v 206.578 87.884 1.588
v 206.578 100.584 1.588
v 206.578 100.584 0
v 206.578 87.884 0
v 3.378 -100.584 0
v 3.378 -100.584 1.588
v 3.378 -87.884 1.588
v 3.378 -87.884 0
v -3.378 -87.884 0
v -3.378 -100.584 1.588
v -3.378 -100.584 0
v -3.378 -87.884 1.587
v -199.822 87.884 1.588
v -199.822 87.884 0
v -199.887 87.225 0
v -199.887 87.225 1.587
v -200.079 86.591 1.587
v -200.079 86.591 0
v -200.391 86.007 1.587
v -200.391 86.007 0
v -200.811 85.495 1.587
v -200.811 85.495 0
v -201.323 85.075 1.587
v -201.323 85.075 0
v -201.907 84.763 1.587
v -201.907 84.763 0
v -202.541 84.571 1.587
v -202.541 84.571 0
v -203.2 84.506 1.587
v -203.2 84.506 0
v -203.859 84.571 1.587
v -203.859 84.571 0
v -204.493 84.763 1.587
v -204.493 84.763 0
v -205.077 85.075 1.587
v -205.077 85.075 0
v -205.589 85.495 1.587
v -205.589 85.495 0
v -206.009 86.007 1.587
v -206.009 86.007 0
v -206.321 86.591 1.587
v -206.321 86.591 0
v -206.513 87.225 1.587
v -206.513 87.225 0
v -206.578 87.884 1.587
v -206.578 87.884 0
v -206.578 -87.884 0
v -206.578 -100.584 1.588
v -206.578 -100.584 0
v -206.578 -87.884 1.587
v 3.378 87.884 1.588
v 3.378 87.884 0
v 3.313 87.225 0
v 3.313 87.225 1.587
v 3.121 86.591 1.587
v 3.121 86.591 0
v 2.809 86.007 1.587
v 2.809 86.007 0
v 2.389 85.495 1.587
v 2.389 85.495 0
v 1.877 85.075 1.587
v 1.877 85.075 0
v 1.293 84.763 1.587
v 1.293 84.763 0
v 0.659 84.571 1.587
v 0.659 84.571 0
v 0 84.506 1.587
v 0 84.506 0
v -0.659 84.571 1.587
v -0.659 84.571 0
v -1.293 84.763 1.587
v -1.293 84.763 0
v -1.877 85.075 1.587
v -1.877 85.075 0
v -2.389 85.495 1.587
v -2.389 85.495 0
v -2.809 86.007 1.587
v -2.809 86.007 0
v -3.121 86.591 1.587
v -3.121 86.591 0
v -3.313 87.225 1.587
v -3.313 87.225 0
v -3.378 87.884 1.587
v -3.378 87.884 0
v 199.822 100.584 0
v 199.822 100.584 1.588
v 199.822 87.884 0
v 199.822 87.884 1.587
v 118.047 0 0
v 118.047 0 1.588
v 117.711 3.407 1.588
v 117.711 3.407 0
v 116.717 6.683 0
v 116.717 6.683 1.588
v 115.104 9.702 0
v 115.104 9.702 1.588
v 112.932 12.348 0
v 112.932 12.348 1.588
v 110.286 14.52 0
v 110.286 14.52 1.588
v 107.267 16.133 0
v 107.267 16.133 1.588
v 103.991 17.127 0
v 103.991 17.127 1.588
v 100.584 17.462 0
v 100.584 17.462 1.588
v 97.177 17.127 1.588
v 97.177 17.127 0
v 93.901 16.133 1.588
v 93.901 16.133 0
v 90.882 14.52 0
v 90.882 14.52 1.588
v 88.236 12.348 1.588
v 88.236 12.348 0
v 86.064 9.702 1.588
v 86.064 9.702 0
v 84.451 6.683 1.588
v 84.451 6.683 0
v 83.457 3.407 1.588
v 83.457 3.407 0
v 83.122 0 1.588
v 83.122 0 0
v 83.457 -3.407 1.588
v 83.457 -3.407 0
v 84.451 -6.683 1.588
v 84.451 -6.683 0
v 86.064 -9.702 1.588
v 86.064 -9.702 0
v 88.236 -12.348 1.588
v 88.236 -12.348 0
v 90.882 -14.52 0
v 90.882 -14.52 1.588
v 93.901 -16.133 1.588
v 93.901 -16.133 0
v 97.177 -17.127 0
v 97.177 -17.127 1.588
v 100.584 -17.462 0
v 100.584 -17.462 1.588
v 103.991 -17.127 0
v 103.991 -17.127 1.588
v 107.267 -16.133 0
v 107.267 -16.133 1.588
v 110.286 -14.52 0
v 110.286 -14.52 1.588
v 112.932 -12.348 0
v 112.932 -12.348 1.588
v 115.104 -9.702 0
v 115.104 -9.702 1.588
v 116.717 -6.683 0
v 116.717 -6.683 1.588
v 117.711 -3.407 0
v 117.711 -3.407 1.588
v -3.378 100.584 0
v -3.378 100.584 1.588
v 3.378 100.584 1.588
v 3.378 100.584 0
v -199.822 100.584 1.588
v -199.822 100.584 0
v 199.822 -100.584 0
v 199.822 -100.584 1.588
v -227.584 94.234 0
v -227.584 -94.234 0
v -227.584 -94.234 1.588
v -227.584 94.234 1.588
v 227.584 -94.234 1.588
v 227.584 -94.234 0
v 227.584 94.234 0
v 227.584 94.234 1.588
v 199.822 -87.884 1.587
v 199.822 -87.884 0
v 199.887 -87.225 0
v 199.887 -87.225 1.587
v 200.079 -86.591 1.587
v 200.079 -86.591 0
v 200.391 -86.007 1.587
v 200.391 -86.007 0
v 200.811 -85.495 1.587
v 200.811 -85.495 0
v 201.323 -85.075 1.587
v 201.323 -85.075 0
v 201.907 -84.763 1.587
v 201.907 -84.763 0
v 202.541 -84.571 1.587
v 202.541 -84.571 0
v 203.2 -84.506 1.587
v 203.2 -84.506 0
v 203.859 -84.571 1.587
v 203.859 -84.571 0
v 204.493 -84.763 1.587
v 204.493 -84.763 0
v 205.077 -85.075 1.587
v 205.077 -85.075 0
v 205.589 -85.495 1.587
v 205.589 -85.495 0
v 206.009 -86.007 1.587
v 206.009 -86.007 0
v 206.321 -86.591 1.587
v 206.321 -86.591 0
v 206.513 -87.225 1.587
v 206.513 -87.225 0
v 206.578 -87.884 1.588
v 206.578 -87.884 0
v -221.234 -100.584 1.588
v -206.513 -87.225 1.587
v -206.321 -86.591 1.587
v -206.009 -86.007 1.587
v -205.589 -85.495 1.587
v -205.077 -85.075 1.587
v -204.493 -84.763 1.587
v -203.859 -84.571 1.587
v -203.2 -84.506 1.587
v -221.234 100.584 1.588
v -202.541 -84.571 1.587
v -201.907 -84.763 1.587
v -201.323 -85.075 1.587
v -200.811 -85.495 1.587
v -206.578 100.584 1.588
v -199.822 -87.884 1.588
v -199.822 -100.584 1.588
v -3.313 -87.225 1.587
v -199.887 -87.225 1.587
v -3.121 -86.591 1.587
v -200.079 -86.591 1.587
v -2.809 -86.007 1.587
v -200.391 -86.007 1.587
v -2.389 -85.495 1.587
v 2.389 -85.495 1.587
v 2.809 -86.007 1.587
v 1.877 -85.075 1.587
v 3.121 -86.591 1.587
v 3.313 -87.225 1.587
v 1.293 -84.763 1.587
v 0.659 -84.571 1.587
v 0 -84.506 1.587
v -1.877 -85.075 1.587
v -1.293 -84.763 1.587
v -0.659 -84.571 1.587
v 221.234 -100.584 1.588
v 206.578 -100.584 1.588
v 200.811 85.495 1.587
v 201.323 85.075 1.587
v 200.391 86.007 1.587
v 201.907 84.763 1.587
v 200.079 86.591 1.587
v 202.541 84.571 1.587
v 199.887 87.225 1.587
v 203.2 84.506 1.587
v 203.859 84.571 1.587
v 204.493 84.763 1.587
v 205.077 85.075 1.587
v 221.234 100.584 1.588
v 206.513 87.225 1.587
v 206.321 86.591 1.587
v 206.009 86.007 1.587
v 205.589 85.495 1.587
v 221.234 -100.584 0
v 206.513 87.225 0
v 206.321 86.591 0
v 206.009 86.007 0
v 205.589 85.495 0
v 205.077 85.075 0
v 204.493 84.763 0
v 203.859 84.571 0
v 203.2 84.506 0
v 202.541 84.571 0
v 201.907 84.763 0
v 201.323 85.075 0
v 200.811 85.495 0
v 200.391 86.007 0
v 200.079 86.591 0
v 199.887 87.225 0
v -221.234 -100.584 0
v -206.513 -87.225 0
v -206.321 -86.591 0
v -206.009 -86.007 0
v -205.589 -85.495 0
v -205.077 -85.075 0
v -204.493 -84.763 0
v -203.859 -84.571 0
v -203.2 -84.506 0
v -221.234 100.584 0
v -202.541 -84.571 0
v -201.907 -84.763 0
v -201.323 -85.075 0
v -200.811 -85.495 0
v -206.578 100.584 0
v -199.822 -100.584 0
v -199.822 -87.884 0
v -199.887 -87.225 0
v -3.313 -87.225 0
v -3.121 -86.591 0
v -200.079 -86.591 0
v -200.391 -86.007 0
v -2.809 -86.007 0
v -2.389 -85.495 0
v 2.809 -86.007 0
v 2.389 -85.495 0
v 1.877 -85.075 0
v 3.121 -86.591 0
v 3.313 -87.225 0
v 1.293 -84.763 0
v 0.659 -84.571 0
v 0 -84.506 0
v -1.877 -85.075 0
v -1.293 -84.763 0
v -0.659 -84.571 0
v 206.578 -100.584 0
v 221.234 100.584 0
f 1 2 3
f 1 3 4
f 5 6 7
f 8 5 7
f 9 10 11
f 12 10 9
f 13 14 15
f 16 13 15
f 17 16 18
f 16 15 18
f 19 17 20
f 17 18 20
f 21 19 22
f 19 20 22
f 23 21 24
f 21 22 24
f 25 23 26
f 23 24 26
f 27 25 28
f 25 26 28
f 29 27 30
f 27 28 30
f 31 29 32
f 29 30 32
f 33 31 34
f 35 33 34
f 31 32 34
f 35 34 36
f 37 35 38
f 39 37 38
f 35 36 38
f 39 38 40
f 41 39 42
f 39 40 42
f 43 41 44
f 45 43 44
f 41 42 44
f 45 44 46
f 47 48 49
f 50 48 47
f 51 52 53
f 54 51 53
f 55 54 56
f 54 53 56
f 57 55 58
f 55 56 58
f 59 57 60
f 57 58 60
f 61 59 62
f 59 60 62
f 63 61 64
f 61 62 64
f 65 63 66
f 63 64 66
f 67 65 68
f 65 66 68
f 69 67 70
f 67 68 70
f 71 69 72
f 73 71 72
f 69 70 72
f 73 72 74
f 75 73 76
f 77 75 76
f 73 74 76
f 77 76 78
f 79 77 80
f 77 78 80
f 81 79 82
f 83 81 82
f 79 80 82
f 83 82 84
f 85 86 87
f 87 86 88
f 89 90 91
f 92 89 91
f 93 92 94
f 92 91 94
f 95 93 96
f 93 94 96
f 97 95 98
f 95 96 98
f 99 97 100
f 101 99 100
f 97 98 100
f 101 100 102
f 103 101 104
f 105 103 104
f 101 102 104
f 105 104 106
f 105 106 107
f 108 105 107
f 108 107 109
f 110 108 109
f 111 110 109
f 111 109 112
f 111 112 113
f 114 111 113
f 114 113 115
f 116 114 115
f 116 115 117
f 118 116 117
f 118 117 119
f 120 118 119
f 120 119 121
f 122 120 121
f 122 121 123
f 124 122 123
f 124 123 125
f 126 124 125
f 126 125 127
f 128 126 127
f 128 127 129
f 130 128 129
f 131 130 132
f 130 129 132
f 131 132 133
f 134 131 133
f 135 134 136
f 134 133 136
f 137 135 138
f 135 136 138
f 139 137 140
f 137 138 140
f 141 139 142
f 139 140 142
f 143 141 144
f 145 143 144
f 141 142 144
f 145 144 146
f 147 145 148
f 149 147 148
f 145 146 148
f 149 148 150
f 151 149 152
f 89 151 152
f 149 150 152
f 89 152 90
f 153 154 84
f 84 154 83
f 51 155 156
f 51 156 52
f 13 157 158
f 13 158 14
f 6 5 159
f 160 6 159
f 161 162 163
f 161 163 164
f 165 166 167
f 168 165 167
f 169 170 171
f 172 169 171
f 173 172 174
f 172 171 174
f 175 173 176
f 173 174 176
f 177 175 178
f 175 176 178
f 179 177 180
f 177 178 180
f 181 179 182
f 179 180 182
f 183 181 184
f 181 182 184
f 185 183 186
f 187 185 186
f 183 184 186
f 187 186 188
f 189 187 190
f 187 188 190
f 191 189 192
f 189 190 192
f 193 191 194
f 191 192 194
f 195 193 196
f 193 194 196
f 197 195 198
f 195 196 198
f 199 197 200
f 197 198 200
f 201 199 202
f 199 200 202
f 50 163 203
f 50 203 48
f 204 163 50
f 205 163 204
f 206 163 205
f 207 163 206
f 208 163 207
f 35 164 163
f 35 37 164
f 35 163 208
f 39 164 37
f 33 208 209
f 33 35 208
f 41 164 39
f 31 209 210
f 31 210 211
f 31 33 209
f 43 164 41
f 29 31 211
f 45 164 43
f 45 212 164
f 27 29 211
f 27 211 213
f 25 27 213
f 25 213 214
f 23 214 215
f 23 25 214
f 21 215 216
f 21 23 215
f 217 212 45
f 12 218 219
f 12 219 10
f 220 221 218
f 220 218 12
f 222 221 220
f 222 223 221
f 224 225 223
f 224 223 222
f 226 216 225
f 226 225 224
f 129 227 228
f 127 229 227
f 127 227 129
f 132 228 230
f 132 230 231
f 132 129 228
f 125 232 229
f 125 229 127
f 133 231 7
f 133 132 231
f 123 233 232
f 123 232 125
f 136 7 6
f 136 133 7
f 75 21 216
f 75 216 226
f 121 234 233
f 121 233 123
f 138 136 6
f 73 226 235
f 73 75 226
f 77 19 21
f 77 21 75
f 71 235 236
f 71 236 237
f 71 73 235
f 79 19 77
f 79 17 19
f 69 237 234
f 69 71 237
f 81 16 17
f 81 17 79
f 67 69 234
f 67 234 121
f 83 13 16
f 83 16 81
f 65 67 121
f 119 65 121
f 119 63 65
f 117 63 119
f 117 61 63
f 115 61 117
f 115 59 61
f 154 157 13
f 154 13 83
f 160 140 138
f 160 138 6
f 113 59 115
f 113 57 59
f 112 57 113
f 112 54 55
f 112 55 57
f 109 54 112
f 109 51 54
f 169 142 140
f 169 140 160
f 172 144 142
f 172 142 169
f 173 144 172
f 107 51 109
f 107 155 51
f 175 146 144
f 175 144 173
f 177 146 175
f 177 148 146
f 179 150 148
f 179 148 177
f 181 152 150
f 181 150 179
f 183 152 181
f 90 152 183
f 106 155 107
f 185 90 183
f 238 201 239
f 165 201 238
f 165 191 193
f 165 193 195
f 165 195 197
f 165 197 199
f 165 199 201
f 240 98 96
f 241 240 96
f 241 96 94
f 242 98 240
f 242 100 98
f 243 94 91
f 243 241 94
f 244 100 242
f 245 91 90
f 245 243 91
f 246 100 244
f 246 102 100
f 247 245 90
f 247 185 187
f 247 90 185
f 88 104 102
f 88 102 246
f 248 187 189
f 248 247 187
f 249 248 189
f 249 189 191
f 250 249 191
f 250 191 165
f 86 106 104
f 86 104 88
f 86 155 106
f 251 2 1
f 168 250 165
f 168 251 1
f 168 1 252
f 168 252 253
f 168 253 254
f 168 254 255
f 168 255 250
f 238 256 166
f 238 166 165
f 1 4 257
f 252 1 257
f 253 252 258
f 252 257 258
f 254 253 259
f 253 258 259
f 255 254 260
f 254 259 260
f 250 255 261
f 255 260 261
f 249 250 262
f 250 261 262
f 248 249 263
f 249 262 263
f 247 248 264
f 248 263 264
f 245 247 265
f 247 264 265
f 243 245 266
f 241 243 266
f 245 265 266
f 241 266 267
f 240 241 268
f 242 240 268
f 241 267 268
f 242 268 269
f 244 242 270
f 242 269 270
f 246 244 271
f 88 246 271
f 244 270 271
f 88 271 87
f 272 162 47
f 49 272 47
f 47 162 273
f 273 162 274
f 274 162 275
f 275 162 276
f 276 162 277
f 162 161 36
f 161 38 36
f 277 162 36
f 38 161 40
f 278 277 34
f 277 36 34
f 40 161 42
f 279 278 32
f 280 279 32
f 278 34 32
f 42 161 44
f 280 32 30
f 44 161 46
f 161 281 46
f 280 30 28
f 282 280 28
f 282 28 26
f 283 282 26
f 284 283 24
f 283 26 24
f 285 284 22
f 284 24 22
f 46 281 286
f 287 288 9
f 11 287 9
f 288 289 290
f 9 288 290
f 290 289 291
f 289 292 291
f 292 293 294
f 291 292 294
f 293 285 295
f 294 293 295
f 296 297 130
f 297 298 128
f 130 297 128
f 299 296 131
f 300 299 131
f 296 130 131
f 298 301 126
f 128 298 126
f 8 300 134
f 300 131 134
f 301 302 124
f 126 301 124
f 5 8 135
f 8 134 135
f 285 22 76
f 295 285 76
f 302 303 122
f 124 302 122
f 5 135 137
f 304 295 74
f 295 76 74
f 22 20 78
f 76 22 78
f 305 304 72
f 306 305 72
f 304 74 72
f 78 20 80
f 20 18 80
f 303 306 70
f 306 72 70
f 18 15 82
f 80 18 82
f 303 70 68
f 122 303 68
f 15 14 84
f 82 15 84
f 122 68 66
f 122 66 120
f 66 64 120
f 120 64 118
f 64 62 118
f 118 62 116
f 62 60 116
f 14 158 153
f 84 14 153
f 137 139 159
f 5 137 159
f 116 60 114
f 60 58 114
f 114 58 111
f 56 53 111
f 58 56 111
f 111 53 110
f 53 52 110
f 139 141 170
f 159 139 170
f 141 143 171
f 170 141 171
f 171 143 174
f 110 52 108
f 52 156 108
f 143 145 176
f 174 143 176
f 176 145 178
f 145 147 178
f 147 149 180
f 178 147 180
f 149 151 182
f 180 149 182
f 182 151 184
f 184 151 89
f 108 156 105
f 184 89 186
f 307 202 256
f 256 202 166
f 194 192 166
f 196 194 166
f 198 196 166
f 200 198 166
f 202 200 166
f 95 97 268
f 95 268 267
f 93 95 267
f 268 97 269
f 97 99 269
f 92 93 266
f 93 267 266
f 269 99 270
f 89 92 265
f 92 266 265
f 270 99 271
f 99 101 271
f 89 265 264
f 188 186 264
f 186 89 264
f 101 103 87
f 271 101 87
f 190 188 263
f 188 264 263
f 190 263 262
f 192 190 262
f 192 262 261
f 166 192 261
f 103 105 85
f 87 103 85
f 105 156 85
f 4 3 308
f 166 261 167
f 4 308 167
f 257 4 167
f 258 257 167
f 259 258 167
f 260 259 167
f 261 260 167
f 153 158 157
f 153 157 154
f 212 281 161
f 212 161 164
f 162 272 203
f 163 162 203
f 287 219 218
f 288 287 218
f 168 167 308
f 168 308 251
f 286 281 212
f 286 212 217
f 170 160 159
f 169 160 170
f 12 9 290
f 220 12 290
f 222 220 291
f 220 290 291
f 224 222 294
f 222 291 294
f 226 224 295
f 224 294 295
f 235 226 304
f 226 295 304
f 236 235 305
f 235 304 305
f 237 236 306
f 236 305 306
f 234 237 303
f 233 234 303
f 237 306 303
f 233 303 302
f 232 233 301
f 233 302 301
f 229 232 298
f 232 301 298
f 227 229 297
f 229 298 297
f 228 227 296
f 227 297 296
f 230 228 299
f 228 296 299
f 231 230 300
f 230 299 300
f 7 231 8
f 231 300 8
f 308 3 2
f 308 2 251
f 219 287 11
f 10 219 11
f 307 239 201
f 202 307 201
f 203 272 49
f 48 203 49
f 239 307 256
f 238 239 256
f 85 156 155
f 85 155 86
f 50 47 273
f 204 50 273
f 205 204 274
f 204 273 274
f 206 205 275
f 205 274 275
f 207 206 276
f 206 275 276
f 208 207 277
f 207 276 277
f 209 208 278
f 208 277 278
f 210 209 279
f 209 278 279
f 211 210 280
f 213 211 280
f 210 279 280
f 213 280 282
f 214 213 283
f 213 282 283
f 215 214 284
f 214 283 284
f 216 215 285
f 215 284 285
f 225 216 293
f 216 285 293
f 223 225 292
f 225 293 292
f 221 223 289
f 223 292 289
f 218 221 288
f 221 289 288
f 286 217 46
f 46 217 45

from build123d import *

# Parameters (mm, degrees)
SKETCH1_W               = 455.168
SKETCH1_H               = 201.168
BOSS_EXTRUDE1_DEPTH     = 1.5875
F_1_4_CLEARANCE_HOLE1_D = 6.7564
CUT_EXTRUDE1_REACH      = 250.826
SKETCH4_R               = 17.4625
F_1_4_CLEARANCE_HOLE2_D = 6.7564
CUT_EXTRUDE2_REACH      = 250.826
SKETCH7_W               = 6.7564
SKETCH7_H               = 14.478
CHAMFER1_SIZE           = 6.35


with BuildPart() as part:
    # Sketch1 → Boss-Extrude1 (new body)
    with BuildSketch(Plane.XY):
        Rectangle(SKETCH1_W, SKETCH1_H)
    extrude(amount=BOSS_EXTRUDE1_DEPTH)

    # 1/4 Clearance Hole1 (through all)
    with Locations(Plane.XY.offset(1.5875)):
        with Locations((-203.2, 87.884), (203.2, 87.884), (-203.2, -87.884), (203.2, -87.884)):
            Hole(F_1_4_CLEARANCE_HOLE1_D / 2)

    # Sketch4 → Cut-Extrude1 (cut, up to next)
    with BuildSketch(Plane.XY.offset(1.5875), mode=Mode.PRIVATE) as cut_extrude1_sk1:
        with Locations((100.584, 0)):
            Circle(SKETCH4_R)
    cut_extrude1_tool1 = extrude(cut_extrude1_sk1.sketch, amount=-CUT_EXTRUDE1_REACH, mode=Mode.PRIVATE) & part.part
    add(cut_extrude1_tool1.solids().sort_by_distance((100.584, 0, 1.5875))[0], mode=Mode.SUBTRACT)

    # 1/4 Clearance Hole2 (through all)
    with Locations(Plane.XY.offset(1.5875)):
        with Locations((0, -87.884), (0, 87.884)):
            Hole(F_1_4_CLEARANCE_HOLE2_D / 2)

    # Sketch7 → Cut-Extrude2 (cut, up to next)
    with BuildSketch(Plane.XY.offset(1.5875), mode=Mode.PRIVATE) as cut_extrude2_sk1:
        with Locations((-203.2, -95.123)):
            Rectangle(SKETCH7_W, SKETCH7_H)
    cut_extrude2_tool1 = extrude(cut_extrude2_sk1.sketch, amount=-CUT_EXTRUDE2_REACH, mode=Mode.PRIVATE) & part.part
    # Sketch7 → Cut-Extrude2 (cut, up to next)
    with BuildSketch(Plane.XY.offset(1.5875), mode=Mode.PRIVATE) as cut_extrude2_sk2:
        with Locations((0, -95.123)):
            Rectangle(SKETCH7_W, SKETCH7_H)
    cut_extrude2_tool2 = extrude(cut_extrude2_sk2.sketch, amount=-CUT_EXTRUDE2_REACH, mode=Mode.PRIVATE) & part.part
    # Sketch7 → Cut-Extrude2 (cut, up to next)
    with BuildSketch(Plane.XY.offset(1.5875), mode=Mode.PRIVATE) as cut_extrude2_sk3:
        with Locations((203.2, -95.123)):
            Rectangle(SKETCH7_W, SKETCH7_H)
    cut_extrude2_tool3 = extrude(cut_extrude2_sk3.sketch, amount=-CUT_EXTRUDE2_REACH, mode=Mode.PRIVATE) & part.part
    cut_extrude2_1 = cut_extrude2_tool1.solids().sort_by_distance((-203.2, -95.123, 1.5875))[0]
    add(cut_extrude2_1, mode=Mode.SUBTRACT)
    cut_extrude2_2 = cut_extrude2_tool2.solids().sort_by_distance((0, -95.123, 1.5875))[0]
    add(cut_extrude2_2, mode=Mode.SUBTRACT)
    cut_extrude2_3 = cut_extrude2_tool3.solids().sort_by_distance((203.2, -95.123, 1.5875))[0]
    add(cut_extrude2_3, mode=Mode.SUBTRACT)
    cut_extrude2 = cut_extrude2_1 + cut_extrude2_2 + cut_extrude2_3  # Cut-Extrude2 as one shape, for the pattern or mirror that repeats it

    # Mirror1: Cut-Extrude2 across plane
    add(cut_extrude2.mirror(Plane.ZX), mode=Mode.SUBTRACT)

    # Chamfer1
    chamfer1_edges = [part.edges().sort_by_distance(p)[0] for p in [
        (227.584, -100.584, 0.79375),
        (-227.584, -100.584, 0.79375),
        (-227.584, 100.584, 0.79375),
        (227.584, 100.584, 0.79375),
    ]]
    chamfer(chamfer1_edges, length=CHAMFER1_SIZE)


solid = part.part
